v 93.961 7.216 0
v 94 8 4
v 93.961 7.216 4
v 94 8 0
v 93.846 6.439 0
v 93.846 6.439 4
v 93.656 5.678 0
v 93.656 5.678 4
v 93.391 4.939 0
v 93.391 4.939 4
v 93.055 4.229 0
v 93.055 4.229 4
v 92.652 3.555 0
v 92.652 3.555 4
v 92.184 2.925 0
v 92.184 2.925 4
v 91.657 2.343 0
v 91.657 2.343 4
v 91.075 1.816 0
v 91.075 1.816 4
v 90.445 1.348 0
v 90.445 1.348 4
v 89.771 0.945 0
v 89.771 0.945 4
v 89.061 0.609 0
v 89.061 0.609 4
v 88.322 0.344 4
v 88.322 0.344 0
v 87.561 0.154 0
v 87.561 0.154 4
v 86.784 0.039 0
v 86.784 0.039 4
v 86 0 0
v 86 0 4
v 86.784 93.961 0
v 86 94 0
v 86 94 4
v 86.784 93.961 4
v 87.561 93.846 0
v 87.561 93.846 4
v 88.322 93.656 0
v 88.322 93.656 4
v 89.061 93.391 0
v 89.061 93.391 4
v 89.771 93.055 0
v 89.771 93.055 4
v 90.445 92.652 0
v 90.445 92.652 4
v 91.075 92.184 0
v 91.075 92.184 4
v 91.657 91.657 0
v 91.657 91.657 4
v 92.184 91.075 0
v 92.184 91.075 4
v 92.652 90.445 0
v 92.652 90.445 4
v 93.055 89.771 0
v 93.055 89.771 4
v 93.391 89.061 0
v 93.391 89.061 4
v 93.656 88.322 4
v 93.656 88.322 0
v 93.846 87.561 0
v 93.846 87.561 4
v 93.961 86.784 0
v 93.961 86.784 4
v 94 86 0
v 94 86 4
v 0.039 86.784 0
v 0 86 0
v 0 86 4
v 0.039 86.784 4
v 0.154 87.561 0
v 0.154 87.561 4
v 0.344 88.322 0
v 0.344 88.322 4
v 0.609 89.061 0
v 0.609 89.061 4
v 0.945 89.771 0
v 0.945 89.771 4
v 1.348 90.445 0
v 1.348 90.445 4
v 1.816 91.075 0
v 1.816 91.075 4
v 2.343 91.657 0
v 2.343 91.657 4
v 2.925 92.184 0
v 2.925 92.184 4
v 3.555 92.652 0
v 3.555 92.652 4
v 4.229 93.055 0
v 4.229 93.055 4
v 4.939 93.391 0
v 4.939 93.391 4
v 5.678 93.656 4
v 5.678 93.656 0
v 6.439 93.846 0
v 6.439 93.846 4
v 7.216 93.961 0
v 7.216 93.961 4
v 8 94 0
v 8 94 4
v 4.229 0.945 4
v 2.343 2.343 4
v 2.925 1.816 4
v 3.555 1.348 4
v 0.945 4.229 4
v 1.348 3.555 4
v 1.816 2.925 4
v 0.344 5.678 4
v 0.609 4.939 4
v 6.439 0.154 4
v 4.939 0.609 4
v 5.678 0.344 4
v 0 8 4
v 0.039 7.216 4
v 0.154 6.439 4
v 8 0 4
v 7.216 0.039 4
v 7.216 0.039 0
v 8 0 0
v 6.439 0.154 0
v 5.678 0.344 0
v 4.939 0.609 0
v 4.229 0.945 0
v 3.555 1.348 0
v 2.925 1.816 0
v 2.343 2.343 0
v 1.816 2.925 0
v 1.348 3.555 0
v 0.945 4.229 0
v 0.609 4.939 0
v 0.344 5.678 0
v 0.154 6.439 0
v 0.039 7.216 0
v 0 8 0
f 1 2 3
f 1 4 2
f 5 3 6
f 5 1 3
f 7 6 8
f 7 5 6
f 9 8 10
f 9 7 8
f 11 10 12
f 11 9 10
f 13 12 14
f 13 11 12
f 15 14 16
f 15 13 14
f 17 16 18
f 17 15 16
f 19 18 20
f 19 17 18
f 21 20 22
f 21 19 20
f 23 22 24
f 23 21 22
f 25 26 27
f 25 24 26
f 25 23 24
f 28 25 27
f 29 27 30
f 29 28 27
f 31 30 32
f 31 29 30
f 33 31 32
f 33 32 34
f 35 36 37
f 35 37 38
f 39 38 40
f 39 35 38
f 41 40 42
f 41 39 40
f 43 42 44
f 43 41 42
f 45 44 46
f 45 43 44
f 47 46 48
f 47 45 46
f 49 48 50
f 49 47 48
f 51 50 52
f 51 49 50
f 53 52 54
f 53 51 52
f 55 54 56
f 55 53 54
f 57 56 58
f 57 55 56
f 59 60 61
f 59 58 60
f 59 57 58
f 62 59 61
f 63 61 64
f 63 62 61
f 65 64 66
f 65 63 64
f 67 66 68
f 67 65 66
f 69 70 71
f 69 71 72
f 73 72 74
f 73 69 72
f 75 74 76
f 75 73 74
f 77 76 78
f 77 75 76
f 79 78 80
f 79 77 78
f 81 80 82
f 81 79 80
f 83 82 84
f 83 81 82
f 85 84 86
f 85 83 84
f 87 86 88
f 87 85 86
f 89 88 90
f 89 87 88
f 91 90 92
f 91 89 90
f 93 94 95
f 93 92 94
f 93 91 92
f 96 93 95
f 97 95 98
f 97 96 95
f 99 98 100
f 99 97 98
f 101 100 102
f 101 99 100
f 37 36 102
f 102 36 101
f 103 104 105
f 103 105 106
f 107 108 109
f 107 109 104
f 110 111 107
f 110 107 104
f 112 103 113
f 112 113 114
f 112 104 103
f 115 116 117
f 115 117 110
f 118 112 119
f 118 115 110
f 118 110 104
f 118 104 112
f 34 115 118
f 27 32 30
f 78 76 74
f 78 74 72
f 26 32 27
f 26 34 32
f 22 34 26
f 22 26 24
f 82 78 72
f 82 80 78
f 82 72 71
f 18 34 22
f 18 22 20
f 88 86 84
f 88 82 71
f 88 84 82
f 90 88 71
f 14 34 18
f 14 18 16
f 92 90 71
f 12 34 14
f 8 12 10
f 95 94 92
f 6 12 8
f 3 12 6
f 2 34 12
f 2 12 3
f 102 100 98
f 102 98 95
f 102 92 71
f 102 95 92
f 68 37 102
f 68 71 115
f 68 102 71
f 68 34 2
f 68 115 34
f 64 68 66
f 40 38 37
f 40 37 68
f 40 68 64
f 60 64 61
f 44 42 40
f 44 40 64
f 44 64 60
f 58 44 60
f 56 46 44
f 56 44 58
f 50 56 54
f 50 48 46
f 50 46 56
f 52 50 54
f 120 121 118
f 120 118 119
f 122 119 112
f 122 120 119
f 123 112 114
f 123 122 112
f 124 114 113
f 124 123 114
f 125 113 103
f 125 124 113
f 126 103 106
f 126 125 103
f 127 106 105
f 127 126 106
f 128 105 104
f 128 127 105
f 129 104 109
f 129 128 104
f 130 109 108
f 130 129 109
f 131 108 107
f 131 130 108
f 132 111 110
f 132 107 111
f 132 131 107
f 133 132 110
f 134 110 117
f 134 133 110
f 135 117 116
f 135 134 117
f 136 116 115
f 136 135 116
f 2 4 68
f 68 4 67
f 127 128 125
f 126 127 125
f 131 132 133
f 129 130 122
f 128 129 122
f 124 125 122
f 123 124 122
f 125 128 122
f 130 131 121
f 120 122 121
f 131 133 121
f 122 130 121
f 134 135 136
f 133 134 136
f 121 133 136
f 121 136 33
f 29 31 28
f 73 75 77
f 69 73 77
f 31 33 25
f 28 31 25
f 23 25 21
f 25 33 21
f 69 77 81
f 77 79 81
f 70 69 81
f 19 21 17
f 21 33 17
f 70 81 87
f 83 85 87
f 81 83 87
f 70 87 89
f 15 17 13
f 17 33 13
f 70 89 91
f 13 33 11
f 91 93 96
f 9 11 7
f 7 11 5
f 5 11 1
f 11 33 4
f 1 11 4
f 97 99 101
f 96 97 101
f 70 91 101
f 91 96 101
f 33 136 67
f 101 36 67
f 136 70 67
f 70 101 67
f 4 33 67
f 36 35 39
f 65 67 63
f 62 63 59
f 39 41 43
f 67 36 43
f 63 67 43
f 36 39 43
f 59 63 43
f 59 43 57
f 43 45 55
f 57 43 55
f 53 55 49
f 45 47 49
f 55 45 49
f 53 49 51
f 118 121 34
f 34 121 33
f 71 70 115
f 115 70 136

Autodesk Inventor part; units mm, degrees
ref_plane "YZ Plane" through (0, 0, 0) normal (1, 0, 0) x (0, 1, 0)
ref_plane "XZ Plane" through (0, 0, 0) normal (0, 1, 0) x (-1, 0, 0)
ref_plane "XY Plane" through (0, 0, 0) normal (0, 0, 1) x (1, 0, 0)
sketch "Sketch1" plane through (0, 0, 0) normal (0, 0, 1) x (1, 0, 0)
  line L0 (8, 0) -> (86, 0)
  line L1 (94, 8) -> (94, 86)
  line L2 (86, 94) -> (8, 94)
  line L3 (0, 86) -> (0, 8)
  arc A0 (8, 94) -> (0, 86) centre (8, 86) ccw
  arc A1 (94, 86) -> (86, 94) centre (86, 86) ccw
  arc A2 (86, 0) -> (94, 8) centre (86, 8) ccw
  arc A3 (0, 8) -> (8, 0) centre (8, 8) ccw
  point P0 (0, 0)
  point P1 (94, 94)
  point P2 (94, 0)
  point P3 (0, 94)
  dimension "d0" = 94
  dimension "d1" = 94
  dimension "d2" = 8
  dimension "d3" = 8
extrude "Extrusion1" add sketch "Sketch1" along normal blind 4
properties part number "PistonFeederHeadInnerMini" material "Stainless Steel"
